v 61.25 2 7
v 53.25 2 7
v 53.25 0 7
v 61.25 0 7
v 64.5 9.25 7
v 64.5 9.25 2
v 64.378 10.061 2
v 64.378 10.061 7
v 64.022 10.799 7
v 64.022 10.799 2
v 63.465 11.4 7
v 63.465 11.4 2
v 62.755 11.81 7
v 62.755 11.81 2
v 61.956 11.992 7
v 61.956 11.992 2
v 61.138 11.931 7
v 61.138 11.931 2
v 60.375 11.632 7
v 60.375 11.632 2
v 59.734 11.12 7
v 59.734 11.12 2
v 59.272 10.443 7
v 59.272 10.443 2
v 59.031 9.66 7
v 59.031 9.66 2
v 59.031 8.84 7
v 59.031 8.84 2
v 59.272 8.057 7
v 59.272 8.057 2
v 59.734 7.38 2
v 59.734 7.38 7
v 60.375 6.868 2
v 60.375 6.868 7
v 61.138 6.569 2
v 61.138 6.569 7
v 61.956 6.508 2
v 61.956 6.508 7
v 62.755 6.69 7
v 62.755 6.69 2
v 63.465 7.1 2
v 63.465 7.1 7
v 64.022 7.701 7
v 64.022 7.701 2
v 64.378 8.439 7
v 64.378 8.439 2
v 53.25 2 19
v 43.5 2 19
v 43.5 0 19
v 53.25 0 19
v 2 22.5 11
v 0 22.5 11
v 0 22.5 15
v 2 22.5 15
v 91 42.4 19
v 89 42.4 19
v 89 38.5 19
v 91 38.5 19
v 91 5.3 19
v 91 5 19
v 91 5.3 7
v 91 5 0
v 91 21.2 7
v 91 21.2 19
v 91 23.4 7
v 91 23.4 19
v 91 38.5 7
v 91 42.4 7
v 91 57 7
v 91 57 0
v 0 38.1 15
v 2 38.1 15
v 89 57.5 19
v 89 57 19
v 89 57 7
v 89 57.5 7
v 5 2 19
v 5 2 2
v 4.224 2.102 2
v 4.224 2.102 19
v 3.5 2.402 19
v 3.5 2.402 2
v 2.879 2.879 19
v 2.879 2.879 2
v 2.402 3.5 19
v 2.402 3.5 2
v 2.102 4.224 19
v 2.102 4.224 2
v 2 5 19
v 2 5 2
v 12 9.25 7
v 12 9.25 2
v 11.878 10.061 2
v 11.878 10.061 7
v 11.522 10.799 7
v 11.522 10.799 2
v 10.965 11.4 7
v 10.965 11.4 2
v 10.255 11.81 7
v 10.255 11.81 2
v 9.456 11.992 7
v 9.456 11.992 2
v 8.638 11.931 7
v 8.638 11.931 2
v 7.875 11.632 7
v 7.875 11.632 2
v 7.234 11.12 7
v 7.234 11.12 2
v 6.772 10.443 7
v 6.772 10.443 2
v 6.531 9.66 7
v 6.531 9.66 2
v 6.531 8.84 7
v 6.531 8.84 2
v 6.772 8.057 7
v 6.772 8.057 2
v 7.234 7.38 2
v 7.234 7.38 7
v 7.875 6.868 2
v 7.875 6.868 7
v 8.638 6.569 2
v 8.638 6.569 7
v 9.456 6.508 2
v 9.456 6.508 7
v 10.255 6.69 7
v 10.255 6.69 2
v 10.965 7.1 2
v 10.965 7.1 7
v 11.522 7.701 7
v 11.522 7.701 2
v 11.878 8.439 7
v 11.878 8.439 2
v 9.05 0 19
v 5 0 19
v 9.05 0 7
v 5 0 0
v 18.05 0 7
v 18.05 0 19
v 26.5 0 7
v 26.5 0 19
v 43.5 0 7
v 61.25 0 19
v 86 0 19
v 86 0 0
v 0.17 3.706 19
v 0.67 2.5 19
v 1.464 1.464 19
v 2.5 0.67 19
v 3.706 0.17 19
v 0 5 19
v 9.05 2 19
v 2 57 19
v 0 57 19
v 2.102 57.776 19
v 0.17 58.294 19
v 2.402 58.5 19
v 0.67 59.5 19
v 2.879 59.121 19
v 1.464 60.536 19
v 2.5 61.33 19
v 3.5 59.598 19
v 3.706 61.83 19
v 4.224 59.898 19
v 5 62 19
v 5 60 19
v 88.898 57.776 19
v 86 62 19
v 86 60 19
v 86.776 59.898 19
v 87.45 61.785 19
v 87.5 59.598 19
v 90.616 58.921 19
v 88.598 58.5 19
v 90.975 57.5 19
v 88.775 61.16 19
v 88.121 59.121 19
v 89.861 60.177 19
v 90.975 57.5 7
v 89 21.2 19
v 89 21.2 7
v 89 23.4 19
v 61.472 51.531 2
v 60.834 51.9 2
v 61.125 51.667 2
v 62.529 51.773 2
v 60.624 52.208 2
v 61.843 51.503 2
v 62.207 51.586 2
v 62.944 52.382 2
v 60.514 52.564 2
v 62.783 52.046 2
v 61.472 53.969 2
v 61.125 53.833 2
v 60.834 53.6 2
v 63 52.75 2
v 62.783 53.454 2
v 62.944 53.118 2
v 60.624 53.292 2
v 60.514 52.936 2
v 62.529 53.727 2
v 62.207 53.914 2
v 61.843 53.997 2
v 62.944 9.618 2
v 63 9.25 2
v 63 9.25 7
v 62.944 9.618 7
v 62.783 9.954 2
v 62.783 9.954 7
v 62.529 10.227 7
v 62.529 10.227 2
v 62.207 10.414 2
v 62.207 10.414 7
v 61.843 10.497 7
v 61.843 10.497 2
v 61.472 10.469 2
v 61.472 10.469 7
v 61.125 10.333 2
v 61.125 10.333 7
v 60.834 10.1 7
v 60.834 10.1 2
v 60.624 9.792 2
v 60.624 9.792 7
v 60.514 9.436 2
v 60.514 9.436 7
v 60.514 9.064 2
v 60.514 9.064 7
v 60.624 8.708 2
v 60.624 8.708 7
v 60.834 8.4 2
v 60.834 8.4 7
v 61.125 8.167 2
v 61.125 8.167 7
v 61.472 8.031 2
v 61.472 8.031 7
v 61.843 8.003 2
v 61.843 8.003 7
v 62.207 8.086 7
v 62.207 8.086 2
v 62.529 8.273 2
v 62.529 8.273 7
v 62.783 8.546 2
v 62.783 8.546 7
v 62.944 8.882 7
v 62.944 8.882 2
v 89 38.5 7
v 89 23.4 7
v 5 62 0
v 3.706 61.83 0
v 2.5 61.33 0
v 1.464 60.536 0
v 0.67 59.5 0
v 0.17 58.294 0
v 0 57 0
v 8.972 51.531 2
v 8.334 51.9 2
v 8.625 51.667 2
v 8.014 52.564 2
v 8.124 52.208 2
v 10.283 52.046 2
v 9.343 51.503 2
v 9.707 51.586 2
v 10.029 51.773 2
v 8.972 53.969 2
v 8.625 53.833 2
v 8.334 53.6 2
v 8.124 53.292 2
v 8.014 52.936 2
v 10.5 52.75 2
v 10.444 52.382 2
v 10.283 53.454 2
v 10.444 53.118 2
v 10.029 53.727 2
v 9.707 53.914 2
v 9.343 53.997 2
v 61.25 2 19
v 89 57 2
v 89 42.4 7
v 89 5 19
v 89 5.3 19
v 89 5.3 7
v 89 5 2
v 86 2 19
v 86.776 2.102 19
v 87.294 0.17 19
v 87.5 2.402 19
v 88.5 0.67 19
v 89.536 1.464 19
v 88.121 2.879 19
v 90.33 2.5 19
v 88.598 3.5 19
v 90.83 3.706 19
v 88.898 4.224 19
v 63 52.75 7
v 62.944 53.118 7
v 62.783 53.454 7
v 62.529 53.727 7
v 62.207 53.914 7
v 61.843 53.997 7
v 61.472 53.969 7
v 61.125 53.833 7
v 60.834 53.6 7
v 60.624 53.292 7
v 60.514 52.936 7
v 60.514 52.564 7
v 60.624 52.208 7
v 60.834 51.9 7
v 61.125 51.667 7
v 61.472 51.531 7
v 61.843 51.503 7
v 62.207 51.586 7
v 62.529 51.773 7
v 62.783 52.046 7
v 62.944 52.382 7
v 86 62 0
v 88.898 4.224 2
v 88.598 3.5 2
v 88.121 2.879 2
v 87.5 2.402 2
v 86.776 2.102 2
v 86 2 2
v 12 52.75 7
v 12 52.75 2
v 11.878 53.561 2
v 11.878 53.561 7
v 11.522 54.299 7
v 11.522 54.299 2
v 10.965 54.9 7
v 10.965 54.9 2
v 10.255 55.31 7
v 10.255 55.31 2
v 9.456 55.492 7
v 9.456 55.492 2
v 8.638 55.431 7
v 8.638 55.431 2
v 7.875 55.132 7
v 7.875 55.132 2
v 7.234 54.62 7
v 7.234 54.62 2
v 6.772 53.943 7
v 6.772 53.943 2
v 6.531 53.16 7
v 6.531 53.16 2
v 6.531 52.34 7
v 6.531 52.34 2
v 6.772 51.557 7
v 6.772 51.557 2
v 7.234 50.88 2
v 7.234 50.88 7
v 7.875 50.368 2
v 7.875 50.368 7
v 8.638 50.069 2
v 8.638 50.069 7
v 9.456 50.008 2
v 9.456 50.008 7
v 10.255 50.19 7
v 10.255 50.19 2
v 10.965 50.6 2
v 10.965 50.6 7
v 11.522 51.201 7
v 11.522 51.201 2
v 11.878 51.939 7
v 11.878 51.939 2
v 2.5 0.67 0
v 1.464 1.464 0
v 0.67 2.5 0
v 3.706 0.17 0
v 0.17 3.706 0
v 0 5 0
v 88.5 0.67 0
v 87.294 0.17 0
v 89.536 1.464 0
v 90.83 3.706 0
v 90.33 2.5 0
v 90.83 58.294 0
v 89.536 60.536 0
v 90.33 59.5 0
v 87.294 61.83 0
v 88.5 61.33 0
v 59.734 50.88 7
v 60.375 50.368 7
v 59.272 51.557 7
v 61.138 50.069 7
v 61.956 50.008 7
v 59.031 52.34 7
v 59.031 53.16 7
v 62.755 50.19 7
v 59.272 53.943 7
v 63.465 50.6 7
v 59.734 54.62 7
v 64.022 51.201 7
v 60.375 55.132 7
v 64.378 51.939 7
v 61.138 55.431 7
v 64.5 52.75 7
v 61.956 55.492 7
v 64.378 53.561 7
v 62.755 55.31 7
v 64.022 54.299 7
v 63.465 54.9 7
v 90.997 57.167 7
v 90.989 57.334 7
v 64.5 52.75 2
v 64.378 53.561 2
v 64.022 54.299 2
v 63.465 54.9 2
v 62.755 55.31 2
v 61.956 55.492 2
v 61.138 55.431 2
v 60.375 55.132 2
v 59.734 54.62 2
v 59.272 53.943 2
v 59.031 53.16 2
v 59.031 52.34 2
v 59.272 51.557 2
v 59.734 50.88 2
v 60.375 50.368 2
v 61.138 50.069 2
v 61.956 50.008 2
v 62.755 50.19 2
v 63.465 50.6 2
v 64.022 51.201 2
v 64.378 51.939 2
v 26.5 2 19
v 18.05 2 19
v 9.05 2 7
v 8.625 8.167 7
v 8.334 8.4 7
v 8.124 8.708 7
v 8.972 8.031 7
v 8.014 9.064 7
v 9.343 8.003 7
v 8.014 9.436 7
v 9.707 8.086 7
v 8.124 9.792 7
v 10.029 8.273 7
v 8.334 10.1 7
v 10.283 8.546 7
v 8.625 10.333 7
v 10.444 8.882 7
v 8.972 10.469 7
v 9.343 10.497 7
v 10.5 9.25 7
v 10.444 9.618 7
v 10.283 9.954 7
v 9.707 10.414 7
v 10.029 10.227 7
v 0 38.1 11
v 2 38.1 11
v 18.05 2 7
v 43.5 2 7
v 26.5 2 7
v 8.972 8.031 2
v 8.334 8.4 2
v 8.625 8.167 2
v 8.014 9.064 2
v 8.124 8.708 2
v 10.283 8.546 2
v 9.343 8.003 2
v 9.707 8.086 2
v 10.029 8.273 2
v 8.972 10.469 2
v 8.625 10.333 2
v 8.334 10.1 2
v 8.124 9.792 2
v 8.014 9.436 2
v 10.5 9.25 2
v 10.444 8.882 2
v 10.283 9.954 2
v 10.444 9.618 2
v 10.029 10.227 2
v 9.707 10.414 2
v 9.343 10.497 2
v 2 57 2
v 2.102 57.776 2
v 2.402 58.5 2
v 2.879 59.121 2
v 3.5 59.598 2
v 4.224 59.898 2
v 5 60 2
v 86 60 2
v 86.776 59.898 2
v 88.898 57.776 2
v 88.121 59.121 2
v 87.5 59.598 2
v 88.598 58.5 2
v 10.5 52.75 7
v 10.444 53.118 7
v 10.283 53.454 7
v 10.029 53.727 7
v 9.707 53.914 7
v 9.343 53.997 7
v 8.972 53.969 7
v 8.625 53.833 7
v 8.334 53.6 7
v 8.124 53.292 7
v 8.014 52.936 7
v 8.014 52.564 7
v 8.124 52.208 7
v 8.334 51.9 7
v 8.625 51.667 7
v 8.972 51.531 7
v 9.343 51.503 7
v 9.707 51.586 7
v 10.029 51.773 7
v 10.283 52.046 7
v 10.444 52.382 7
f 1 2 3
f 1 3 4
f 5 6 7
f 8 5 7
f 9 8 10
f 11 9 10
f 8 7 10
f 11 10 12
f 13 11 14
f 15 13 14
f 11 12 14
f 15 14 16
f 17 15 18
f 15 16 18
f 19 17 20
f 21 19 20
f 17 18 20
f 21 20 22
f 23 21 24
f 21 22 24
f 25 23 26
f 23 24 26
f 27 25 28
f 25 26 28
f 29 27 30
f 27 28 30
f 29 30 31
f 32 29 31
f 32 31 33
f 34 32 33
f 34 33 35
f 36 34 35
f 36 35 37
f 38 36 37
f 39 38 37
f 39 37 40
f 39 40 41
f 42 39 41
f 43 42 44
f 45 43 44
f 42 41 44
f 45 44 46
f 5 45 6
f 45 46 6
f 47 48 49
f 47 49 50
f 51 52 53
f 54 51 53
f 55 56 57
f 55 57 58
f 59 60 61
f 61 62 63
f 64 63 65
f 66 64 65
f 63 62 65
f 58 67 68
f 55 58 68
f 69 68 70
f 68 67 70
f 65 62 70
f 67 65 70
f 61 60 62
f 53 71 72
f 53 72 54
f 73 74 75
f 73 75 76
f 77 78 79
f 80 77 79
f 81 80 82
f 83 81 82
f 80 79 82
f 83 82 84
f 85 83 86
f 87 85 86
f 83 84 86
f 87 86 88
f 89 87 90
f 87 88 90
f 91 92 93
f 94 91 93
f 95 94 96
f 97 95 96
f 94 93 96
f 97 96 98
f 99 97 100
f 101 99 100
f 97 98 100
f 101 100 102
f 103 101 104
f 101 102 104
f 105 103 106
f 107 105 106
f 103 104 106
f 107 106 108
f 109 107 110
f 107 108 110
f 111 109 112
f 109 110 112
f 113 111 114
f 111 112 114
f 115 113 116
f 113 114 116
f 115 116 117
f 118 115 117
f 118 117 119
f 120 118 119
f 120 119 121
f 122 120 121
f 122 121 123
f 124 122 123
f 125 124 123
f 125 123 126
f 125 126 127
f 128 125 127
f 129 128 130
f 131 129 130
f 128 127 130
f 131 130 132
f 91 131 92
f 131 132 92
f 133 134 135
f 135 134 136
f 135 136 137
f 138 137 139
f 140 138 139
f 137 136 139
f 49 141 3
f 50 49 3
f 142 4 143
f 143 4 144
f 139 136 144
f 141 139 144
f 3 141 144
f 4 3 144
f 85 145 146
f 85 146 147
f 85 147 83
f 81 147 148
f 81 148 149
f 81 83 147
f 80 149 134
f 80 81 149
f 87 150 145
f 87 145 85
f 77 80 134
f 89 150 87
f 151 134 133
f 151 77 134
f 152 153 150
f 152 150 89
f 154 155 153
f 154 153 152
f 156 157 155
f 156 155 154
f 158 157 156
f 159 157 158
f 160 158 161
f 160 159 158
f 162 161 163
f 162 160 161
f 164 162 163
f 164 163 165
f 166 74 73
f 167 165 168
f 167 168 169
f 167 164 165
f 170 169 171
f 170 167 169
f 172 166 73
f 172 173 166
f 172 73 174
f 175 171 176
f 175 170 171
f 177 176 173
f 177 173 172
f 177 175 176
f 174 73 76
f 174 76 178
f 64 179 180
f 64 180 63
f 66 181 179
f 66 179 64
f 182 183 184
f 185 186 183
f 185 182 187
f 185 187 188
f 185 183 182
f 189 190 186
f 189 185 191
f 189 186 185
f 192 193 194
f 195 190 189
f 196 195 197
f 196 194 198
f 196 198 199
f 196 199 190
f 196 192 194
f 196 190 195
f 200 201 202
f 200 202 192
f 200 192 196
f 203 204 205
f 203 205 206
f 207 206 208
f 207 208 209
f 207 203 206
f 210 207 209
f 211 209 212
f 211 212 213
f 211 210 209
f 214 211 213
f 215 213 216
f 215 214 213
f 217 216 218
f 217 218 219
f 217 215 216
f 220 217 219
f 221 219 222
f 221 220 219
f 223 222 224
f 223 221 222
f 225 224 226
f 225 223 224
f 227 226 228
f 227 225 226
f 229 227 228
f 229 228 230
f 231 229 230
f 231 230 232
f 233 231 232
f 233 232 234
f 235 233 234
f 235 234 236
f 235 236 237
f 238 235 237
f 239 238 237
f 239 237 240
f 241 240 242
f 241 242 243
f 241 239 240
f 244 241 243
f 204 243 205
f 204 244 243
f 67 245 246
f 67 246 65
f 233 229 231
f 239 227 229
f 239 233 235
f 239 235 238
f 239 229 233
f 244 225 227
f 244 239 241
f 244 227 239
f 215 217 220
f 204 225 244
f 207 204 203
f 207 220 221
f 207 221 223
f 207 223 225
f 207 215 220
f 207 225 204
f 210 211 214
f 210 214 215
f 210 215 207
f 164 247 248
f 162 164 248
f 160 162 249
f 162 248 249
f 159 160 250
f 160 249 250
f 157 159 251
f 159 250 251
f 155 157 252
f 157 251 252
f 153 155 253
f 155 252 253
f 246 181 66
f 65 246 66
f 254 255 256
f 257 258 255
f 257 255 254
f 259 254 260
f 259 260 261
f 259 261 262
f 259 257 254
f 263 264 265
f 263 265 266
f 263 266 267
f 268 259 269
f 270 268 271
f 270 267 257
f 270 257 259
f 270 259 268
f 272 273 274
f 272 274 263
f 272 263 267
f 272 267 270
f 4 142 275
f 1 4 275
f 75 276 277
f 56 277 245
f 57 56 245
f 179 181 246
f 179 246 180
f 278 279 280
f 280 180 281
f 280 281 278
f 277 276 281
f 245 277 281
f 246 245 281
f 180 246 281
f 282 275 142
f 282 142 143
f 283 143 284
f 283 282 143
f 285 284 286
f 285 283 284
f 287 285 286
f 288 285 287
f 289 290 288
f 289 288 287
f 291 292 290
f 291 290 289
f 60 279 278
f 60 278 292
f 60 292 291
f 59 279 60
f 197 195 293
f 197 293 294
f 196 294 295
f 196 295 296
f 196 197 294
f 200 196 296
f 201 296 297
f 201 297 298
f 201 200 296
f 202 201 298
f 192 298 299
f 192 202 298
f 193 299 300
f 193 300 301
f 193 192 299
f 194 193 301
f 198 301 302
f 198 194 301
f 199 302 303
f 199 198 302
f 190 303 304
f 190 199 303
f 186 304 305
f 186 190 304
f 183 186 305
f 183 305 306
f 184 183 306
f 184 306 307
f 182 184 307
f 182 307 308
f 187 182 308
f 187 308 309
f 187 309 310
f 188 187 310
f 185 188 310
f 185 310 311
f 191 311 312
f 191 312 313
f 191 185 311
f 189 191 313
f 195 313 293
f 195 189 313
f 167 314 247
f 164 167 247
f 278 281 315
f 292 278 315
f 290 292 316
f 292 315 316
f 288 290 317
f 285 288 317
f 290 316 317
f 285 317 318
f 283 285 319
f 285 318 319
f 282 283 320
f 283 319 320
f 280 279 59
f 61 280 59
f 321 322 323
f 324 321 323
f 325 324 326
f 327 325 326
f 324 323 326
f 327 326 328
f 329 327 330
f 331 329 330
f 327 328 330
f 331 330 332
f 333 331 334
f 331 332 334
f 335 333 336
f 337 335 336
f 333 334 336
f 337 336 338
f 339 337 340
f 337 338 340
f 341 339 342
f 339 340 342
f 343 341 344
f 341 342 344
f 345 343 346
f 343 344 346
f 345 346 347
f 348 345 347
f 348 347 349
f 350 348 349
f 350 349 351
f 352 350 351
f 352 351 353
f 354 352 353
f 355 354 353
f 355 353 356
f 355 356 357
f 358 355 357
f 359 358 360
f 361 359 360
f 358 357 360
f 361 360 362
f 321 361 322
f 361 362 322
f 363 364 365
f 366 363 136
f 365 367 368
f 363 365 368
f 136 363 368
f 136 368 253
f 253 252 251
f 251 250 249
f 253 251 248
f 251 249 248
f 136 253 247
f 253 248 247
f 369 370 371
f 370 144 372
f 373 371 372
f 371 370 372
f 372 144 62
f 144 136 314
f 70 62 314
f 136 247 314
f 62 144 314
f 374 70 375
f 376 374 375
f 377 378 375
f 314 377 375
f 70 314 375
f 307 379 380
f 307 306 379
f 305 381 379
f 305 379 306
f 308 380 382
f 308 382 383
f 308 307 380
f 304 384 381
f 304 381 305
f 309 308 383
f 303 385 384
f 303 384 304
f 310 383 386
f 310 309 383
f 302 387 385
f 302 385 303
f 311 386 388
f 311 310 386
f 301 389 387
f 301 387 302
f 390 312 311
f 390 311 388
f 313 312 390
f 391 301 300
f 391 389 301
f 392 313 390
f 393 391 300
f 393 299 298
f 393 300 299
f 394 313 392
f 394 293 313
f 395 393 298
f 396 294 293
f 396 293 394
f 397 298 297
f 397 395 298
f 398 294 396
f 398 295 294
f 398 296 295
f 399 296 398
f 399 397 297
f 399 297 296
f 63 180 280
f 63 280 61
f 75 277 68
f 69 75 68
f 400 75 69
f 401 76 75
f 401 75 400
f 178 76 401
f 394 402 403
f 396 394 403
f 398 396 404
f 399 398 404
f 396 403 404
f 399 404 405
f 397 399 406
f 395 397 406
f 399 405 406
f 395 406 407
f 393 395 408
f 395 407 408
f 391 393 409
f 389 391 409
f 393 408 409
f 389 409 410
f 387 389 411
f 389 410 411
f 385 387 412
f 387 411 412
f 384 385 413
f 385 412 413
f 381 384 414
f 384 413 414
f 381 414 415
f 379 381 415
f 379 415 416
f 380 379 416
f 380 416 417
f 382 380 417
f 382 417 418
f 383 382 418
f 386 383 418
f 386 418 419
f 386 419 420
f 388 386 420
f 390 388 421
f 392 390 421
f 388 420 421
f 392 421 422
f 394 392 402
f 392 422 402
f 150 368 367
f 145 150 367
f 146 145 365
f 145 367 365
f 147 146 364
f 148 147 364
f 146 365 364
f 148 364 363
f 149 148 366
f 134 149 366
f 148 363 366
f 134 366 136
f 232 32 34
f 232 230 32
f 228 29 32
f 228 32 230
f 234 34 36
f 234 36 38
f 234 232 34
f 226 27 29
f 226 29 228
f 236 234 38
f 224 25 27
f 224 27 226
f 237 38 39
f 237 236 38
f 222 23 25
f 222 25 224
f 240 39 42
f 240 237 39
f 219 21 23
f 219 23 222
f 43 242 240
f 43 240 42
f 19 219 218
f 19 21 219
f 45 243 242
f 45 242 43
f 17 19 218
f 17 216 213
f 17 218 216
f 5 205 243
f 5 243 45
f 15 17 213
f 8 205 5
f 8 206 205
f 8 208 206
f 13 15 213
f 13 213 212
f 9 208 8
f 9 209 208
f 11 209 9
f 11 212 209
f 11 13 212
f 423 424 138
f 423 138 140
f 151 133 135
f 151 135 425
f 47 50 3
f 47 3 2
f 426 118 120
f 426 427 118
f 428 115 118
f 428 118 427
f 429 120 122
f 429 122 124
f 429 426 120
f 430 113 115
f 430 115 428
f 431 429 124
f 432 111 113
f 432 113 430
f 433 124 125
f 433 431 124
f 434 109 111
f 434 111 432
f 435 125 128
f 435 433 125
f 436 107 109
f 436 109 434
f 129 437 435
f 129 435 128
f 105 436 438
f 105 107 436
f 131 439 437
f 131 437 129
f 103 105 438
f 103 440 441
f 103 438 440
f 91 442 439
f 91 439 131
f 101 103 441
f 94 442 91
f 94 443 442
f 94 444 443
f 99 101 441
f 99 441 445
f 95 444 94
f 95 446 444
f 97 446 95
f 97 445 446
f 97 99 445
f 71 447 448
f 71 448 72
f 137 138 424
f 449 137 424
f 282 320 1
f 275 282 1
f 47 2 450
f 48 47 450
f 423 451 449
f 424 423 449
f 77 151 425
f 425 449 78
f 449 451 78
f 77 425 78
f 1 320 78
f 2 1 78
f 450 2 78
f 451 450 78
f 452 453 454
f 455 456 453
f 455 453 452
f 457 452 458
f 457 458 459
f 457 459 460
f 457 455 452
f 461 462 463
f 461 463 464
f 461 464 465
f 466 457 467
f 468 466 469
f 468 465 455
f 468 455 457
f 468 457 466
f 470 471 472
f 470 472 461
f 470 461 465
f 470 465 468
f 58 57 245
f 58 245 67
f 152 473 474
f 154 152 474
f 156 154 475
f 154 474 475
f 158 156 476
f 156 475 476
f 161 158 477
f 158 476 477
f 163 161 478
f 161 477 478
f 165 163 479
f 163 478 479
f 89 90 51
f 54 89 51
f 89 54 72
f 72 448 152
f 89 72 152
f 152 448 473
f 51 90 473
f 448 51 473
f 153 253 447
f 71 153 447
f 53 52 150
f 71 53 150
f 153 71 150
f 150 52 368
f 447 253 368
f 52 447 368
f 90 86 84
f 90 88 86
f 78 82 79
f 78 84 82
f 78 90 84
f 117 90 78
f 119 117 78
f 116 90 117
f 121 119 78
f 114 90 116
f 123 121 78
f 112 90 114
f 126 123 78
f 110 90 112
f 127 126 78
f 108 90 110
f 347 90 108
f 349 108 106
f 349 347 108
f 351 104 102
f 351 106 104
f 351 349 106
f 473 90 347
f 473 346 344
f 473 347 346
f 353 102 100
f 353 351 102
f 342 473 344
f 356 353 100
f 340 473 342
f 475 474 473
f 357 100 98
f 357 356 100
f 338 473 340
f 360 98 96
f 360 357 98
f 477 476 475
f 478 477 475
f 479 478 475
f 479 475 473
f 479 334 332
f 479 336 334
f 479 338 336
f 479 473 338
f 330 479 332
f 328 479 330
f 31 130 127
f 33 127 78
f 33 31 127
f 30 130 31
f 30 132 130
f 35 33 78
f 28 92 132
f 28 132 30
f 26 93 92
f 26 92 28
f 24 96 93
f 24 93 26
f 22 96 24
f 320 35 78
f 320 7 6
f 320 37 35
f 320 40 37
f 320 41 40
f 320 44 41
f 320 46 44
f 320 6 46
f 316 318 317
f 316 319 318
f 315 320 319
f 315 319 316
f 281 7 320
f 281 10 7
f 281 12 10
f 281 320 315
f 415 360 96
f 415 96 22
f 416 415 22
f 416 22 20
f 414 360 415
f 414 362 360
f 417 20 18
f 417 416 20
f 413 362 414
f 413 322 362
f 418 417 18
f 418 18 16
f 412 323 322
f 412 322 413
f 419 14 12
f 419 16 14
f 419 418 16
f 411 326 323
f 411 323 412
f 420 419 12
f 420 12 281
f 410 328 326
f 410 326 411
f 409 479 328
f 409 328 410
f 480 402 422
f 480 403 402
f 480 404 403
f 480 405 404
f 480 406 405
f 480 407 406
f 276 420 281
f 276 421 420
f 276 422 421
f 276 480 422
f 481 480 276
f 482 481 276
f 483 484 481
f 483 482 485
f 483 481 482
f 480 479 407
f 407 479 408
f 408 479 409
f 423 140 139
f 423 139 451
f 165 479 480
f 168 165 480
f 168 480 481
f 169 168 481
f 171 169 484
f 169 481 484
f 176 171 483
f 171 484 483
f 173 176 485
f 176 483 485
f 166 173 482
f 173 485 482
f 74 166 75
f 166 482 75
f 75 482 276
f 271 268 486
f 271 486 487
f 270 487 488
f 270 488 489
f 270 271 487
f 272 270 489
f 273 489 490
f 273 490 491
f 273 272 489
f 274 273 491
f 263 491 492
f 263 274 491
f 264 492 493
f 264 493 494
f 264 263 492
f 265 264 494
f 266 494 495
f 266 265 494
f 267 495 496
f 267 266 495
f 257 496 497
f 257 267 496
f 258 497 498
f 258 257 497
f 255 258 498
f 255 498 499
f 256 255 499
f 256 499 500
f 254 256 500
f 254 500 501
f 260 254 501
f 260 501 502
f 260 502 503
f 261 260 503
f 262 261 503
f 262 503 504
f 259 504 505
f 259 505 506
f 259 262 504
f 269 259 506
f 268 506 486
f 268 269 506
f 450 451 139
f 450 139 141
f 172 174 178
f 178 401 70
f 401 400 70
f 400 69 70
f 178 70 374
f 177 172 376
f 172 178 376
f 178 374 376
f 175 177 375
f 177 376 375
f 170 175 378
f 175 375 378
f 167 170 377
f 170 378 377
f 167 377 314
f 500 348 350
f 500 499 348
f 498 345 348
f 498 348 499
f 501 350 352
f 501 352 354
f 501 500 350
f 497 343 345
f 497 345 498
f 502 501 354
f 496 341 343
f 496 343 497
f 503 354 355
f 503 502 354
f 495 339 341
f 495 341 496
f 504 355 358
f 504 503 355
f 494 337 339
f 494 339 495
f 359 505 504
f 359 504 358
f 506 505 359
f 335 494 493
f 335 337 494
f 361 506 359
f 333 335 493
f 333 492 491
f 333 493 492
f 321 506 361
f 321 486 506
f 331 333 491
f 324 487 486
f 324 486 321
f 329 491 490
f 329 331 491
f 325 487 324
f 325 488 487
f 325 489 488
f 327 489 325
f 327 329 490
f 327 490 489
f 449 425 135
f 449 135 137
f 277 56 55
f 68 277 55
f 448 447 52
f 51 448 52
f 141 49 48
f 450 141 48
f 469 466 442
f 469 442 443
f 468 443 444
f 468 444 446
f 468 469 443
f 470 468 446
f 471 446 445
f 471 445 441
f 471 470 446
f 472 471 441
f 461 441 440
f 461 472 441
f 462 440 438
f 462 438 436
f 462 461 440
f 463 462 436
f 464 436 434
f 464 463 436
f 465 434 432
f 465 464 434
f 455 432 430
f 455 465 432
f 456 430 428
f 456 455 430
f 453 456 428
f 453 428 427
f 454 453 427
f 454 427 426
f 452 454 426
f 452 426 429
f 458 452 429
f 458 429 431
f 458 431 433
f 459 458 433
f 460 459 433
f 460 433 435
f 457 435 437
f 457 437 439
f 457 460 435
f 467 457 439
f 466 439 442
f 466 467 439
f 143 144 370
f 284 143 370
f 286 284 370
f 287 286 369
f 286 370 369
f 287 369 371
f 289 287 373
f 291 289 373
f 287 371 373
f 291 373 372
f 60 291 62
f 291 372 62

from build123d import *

# Parameters (mm, degrees)
F1_DEPTH = 2
F2_DEPTH = 19
F3_R     = 2.75
F3_R_2   = 1.25
F4_DEPTH = 5
F5_W     = 9
F5_H     = 2
F5_W_2   = 2
F5_H_2   = 15.1
F5_W_3   = 17
F5_W_4   = 8
F5_H_3   = 15.9
F6_DEPTH = 12
F7_W     = 15.6
F7_H     = 4
F8_DEPTH = 25


with BuildPart() as f1:
    # F0 (on Top) → F1 (new body)
    with BuildSketch(Plane.XY):
        with BuildLine():
            ThreePointArc((0, 5), (1.4644660941, 1.4644660941), (5, 0))
            Line((5, 0), (86, 0))
            ThreePointArc((86, 0), (89.5355339059, 1.4644660941), (91, 5))
            Line((91, 5), (91, 57))
            ThreePointArc((91, 57), (89.5355339059, 60.5355339059), (86, 62))
            Line((86, 62), (5, 62))
            ThreePointArc((5, 62), (1.4644660941, 60.5355339059), (0, 57))
            Line((0, 57), (0, 5))
        make_face()
        with BuildLine():
            ThreePointArc((2, 57), (2.8786796564, 59.1213203436), (5, 60))
            Line((5, 60), (86, 60))
            ThreePointArc((86, 60), (88.1213203436, 59.1213203436), (89, 57))
            Line((89, 57), (89, 5))
            ThreePointArc((89, 5), (88.1213203436, 2.8786796564), (86, 2))
            Line((86, 2), (5, 2))
            ThreePointArc((5, 2), (2.8786796564, 2.8786796564), (2, 5))
            Line((2, 5), (2, 57))
        make_face(mode=Mode.SUBTRACT)
        with BuildLine():
            Line((86, 60), (5, 60))
            ThreePointArc((5, 60), (2.8786796564, 59.1213203436), (2, 57))
            Line((2, 57), (2, 5))
            ThreePointArc((2, 5), (2.8786796564, 2.8786796564), (5, 2))
            Line((5, 2), (86, 2))
            ThreePointArc((86, 2), (88.1213203436, 2.8786796564), (89, 5))
            Line((89, 5), (89, 57))
            ThreePointArc((89, 57), (88.1213203436, 59.1213203436), (86, 60))
        make_face()
    extrude(amount=F1_DEPTH)

    # F0 (on Top) → F2 (join)
    with BuildSketch(Plane.XY):
        with BuildLine():
            ThreePointArc((0, 5), (1.4644660941, 1.4644660941), (5, 0))
            Line((5, 0), (86, 0))
            ThreePointArc((86, 0), (89.5355339059, 1.4644660941), (91, 5))
            Line((91, 5), (91, 57))
            ThreePointArc((91, 57), (89.5355339059, 60.5355339059), (86, 62))
            Line((86, 62), (5, 62))
            ThreePointArc((5, 62), (1.4644660941, 60.5355339059), (0, 57))
            Line((0, 57), (0, 5))
        make_face()
        with BuildLine():
            ThreePointArc((2, 57), (2.8786796564, 59.1213203436), (5, 60))
            Line((5, 60), (86, 60))
            ThreePointArc((86, 60), (88.1213203436, 59.1213203436), (89, 57))
            Line((89, 57), (89, 5))
            ThreePointArc((89, 5), (88.1213203436, 2.8786796564), (86, 2))
            Line((86, 2), (5, 2))
            ThreePointArc((5, 2), (2.8786796564, 2.8786796564), (2, 5))
            Line((2, 5), (2, 57))
        make_face(mode=Mode.SUBTRACT)
    extrude(amount=F2_DEPTH)

    # F3 (on face) → F4 (join)
    with BuildSketch(Plane.XY.offset(2)):
        with Locations((9.25, 52.75)):
            Circle(F3_R)
        with Locations((9.25, 52.75)):
            Circle(F3_R_2, mode=Mode.SUBTRACT)
        with Locations((9.25, 9.25)):
            Circle(F3_R)
        with Locations((9.25, 9.25)):
            Circle(F3_R_2, mode=Mode.SUBTRACT)
        with Locations((61.75, 9.25)):
            Circle(F3_R)
        with Locations((61.75, 9.25)):
            Circle(F3_R_2, mode=Mode.SUBTRACT)
        with Locations((61.75, 52.75)):
            Circle(F3_R)
        with Locations((61.75, 52.75)):
            Circle(F3_R_2, mode=Mode.SUBTRACT)
    extrude(amount=F4_DEPTH)

    # F5 (on face) → F6 (cut)
    with BuildSketch(Plane.XY.offset(19)):
        with Locations((13.55, 1)):
            Rectangle(F5_W, F5_H)
        with Locations((90, 49.95)):
            Rectangle(F5_W_2, F5_H_2)
        with Locations((35, 1)):
            Rectangle(F5_W_3, F5_H)
        with Locations((57.25, 1)):
            Rectangle(F5_W_4, F5_H)
        with Locations((90, 13.25)):
            Rectangle(F5_W_2, F5_H_3)
        with Locations((90, 30.95)):
            Rectangle(F5_W_2, F5_H_2)
    extrude(amount=-F6_DEPTH, mode=Mode.SUBTRACT)

    # F7 (on face) → F8 (cut)
    with BuildSketch(Plane(origin=(0, 0, 0), x_dir=(0, -1, 0), z_dir=(-1, 0, 0))):
        with Locations((-30.3, 13)):
            Rectangle(F7_W, F7_H)
    extrude(amount=-F8_DEPTH, mode=Mode.SUBTRACT)


solid = f1.part
